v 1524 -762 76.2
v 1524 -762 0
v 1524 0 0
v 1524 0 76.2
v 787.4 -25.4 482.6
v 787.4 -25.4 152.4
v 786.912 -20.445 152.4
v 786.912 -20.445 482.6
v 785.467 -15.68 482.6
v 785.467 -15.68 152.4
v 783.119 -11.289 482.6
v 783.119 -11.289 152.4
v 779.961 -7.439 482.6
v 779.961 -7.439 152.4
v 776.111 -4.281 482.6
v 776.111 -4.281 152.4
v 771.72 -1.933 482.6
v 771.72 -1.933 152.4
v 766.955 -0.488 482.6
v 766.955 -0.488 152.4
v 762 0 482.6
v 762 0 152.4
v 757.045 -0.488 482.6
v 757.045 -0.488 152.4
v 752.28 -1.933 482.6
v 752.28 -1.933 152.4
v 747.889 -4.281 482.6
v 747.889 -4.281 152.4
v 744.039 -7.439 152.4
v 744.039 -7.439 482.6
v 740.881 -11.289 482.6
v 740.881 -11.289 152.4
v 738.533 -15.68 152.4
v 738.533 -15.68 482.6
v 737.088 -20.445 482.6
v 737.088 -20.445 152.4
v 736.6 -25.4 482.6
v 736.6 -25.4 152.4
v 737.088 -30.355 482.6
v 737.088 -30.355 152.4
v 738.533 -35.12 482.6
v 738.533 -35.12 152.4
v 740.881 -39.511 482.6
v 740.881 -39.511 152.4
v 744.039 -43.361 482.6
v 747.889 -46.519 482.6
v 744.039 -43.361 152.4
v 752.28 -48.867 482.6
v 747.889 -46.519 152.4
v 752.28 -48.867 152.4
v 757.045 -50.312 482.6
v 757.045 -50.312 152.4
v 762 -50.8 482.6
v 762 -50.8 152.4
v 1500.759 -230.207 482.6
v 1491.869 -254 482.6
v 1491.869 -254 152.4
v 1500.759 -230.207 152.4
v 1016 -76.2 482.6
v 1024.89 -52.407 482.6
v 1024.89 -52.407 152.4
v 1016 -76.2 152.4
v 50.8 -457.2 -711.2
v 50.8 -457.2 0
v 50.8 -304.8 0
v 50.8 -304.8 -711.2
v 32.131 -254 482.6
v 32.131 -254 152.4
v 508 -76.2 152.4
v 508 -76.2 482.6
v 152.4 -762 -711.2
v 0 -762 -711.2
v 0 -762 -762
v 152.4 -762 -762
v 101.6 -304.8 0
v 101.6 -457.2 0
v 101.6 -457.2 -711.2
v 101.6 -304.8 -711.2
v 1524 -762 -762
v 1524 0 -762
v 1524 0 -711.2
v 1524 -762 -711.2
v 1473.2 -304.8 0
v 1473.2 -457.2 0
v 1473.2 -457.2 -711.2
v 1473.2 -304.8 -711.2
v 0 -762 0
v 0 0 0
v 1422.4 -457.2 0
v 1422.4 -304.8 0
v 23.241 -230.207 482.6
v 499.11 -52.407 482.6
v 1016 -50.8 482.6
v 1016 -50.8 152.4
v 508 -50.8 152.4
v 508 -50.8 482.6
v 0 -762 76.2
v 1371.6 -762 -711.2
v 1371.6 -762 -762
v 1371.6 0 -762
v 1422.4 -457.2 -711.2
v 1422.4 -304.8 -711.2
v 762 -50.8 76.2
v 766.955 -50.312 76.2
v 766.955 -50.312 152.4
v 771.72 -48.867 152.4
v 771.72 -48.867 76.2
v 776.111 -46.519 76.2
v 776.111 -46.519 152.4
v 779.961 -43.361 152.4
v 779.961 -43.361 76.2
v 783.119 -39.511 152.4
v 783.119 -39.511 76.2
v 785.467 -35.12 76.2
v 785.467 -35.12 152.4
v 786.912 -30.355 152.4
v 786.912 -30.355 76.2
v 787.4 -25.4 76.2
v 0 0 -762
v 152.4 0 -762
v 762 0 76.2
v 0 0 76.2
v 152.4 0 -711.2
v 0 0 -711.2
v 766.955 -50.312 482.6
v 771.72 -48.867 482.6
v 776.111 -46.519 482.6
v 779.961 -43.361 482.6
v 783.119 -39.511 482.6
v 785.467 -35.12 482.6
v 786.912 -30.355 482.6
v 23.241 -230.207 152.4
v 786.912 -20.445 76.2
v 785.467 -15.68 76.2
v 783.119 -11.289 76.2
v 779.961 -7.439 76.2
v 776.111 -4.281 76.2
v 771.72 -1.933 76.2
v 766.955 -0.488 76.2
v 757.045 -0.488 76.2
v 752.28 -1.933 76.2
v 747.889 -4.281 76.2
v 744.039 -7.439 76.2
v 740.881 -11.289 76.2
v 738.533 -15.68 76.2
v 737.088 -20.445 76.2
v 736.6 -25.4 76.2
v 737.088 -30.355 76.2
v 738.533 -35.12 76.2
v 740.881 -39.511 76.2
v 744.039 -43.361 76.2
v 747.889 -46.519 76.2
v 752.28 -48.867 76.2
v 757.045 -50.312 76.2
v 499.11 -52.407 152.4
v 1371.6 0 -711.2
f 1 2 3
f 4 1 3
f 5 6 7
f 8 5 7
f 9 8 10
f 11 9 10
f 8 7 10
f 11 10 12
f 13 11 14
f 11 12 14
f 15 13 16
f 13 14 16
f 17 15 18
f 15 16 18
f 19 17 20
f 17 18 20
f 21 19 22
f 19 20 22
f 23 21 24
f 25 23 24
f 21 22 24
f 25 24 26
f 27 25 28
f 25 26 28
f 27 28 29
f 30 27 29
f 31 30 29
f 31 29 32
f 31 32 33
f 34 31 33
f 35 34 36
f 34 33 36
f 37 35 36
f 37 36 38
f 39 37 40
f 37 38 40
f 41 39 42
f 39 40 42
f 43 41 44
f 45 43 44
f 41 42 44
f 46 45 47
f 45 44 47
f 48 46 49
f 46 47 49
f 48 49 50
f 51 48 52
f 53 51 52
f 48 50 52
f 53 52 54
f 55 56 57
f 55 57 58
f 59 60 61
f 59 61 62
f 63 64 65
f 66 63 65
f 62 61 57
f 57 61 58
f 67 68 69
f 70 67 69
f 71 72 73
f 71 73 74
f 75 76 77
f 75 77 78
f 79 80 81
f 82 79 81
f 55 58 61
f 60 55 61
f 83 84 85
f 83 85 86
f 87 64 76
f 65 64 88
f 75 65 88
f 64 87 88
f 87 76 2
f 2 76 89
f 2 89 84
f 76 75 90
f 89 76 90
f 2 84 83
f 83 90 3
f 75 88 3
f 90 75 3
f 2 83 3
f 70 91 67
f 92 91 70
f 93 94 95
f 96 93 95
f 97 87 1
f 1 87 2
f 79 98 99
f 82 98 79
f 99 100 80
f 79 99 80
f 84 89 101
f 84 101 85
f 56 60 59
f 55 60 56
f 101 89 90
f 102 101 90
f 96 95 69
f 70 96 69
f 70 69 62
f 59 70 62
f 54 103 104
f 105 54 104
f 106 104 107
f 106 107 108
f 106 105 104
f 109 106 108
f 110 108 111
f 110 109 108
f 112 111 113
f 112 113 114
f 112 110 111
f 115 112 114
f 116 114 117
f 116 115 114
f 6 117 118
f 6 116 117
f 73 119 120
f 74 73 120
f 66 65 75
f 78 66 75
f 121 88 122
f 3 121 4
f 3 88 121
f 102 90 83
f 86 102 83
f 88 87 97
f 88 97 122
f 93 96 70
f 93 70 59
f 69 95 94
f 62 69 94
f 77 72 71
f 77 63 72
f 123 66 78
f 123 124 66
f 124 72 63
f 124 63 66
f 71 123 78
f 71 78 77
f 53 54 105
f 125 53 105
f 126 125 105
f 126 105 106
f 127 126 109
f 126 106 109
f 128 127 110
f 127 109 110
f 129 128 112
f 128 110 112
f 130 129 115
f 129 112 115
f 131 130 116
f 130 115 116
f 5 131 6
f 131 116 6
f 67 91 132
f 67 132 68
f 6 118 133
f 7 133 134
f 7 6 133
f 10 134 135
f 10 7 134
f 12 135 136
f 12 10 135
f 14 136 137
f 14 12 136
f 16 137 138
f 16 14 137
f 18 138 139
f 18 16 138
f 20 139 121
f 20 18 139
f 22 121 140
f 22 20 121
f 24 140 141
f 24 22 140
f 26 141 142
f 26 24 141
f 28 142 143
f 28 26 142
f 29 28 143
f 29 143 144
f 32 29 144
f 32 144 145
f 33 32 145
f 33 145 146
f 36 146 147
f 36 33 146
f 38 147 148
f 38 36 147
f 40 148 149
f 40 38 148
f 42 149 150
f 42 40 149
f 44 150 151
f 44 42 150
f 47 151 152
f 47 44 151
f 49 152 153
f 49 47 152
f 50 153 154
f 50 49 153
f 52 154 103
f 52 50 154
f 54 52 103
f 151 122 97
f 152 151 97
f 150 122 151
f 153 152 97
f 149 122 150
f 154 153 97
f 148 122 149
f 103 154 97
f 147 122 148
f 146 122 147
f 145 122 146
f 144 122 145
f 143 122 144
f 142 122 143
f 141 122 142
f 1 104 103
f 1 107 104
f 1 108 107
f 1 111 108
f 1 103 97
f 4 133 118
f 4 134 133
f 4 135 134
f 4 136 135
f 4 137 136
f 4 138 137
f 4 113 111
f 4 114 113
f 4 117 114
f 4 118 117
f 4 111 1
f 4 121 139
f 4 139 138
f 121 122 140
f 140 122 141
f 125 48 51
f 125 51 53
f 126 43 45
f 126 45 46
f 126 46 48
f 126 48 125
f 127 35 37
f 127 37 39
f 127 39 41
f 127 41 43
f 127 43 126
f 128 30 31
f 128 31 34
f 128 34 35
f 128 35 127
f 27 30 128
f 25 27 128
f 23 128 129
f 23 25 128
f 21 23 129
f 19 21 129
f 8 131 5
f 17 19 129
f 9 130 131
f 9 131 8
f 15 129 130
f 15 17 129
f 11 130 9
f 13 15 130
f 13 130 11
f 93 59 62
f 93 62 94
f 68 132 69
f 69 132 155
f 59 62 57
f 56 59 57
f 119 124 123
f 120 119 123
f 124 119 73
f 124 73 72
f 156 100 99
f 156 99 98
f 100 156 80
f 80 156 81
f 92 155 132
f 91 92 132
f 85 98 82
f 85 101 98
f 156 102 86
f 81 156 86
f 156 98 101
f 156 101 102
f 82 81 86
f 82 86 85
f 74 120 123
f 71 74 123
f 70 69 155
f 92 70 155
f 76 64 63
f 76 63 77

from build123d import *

# Parameters (mm, degrees)
F0_W          = 1524
F0_H          = 762
F1_DEPTH      = 76.2
F2_W          = 50.8
F2_H          = 152.4
F3_DEPTH      = 711.2
F4_W          = 152.4
F4_H          = 50.8
F5_DEPTH      = 762
F8_DEPTH      = 76.2
F8_DEPTH_BACK = 330.2
F9_DEPTH      = 330.2


with BuildPart() as f1:
    # F0 (on Top) → F1 (new body)
    with BuildSketch(Plane.XY):
        with Locations((762, -381)):
            Rectangle(F0_W, F0_H)
    extrude(amount=F1_DEPTH)

    # F2 (on Top) → F3 (join)
    with BuildSketch(Plane.XY):
        with Locations((76.2, -381)):
            Rectangle(F2_W, F2_H)
        with Locations((1447.8, -381)):
            Rectangle(F2_W, F2_H)
    extrude(amount=-F3_DEPTH)

    # F4 (on Front) → F5 (join)
    with BuildSketch(Plane.XZ):
        with Locations((1447.8, -736.6)):
            Rectangle(F4_W, F4_H)
        with Locations((76.2, -736.6)):
            Rectangle(F4_W, F4_H)
    extrude(amount=F5_DEPTH)

    # F7 (on offset) → F8 (join, two sides)
    with BuildSketch(Plane.XY.offset(152.4)) as f8_sk:
        with BuildLine():
            ThreePointArc((787.4, -25.4), (744.0394877579, -7.4394877579), (762, -50.8))
            ThreePointArc((762, -50.8), (779.9605122421, -43.3605122421), (787.4, -25.4))
        make_face()
    extrude(amount=-F8_DEPTH)
    extrude(f8_sk.sketch, amount=F8_DEPTH_BACK)


with BuildPart() as f9:
    # F7 (on offset) → F9 (new body)
    with BuildSketch(Plane.XY.offset(152.4)):
        Polygon((499.11, -52.4065576261), (23.241152522, -230.2065576261), (32.131152522, -254), (508, -76.2), align=None)
    extrude(amount=F9_DEPTH)


with BuildPart() as f9b:
    # F7 (on offset) → F9, piece 2 (new body)
    with BuildSketch(Plane.XY.offset(152.4)):
        Polygon((508, -50.8), (508, -76.2), (1016, -76.2), (1016, -50.8), (762, -50.8), align=None)
    extrude(amount=F9_DEPTH)


with BuildPart() as f9c:
    # F7 (on offset) → F9, piece 3 (new body)
    with BuildSketch(Plane.XY.offset(152.4)):
        Polygon((1024.89, -52.4065576261), (1016, -76.2), (1491.868847478, -254), (1500.758847478, -230.2065576261), align=None)
    extrude(amount=F9_DEPTH)


solid = Compound([f1.part, f9.part, f9b.part, f9c.part])
